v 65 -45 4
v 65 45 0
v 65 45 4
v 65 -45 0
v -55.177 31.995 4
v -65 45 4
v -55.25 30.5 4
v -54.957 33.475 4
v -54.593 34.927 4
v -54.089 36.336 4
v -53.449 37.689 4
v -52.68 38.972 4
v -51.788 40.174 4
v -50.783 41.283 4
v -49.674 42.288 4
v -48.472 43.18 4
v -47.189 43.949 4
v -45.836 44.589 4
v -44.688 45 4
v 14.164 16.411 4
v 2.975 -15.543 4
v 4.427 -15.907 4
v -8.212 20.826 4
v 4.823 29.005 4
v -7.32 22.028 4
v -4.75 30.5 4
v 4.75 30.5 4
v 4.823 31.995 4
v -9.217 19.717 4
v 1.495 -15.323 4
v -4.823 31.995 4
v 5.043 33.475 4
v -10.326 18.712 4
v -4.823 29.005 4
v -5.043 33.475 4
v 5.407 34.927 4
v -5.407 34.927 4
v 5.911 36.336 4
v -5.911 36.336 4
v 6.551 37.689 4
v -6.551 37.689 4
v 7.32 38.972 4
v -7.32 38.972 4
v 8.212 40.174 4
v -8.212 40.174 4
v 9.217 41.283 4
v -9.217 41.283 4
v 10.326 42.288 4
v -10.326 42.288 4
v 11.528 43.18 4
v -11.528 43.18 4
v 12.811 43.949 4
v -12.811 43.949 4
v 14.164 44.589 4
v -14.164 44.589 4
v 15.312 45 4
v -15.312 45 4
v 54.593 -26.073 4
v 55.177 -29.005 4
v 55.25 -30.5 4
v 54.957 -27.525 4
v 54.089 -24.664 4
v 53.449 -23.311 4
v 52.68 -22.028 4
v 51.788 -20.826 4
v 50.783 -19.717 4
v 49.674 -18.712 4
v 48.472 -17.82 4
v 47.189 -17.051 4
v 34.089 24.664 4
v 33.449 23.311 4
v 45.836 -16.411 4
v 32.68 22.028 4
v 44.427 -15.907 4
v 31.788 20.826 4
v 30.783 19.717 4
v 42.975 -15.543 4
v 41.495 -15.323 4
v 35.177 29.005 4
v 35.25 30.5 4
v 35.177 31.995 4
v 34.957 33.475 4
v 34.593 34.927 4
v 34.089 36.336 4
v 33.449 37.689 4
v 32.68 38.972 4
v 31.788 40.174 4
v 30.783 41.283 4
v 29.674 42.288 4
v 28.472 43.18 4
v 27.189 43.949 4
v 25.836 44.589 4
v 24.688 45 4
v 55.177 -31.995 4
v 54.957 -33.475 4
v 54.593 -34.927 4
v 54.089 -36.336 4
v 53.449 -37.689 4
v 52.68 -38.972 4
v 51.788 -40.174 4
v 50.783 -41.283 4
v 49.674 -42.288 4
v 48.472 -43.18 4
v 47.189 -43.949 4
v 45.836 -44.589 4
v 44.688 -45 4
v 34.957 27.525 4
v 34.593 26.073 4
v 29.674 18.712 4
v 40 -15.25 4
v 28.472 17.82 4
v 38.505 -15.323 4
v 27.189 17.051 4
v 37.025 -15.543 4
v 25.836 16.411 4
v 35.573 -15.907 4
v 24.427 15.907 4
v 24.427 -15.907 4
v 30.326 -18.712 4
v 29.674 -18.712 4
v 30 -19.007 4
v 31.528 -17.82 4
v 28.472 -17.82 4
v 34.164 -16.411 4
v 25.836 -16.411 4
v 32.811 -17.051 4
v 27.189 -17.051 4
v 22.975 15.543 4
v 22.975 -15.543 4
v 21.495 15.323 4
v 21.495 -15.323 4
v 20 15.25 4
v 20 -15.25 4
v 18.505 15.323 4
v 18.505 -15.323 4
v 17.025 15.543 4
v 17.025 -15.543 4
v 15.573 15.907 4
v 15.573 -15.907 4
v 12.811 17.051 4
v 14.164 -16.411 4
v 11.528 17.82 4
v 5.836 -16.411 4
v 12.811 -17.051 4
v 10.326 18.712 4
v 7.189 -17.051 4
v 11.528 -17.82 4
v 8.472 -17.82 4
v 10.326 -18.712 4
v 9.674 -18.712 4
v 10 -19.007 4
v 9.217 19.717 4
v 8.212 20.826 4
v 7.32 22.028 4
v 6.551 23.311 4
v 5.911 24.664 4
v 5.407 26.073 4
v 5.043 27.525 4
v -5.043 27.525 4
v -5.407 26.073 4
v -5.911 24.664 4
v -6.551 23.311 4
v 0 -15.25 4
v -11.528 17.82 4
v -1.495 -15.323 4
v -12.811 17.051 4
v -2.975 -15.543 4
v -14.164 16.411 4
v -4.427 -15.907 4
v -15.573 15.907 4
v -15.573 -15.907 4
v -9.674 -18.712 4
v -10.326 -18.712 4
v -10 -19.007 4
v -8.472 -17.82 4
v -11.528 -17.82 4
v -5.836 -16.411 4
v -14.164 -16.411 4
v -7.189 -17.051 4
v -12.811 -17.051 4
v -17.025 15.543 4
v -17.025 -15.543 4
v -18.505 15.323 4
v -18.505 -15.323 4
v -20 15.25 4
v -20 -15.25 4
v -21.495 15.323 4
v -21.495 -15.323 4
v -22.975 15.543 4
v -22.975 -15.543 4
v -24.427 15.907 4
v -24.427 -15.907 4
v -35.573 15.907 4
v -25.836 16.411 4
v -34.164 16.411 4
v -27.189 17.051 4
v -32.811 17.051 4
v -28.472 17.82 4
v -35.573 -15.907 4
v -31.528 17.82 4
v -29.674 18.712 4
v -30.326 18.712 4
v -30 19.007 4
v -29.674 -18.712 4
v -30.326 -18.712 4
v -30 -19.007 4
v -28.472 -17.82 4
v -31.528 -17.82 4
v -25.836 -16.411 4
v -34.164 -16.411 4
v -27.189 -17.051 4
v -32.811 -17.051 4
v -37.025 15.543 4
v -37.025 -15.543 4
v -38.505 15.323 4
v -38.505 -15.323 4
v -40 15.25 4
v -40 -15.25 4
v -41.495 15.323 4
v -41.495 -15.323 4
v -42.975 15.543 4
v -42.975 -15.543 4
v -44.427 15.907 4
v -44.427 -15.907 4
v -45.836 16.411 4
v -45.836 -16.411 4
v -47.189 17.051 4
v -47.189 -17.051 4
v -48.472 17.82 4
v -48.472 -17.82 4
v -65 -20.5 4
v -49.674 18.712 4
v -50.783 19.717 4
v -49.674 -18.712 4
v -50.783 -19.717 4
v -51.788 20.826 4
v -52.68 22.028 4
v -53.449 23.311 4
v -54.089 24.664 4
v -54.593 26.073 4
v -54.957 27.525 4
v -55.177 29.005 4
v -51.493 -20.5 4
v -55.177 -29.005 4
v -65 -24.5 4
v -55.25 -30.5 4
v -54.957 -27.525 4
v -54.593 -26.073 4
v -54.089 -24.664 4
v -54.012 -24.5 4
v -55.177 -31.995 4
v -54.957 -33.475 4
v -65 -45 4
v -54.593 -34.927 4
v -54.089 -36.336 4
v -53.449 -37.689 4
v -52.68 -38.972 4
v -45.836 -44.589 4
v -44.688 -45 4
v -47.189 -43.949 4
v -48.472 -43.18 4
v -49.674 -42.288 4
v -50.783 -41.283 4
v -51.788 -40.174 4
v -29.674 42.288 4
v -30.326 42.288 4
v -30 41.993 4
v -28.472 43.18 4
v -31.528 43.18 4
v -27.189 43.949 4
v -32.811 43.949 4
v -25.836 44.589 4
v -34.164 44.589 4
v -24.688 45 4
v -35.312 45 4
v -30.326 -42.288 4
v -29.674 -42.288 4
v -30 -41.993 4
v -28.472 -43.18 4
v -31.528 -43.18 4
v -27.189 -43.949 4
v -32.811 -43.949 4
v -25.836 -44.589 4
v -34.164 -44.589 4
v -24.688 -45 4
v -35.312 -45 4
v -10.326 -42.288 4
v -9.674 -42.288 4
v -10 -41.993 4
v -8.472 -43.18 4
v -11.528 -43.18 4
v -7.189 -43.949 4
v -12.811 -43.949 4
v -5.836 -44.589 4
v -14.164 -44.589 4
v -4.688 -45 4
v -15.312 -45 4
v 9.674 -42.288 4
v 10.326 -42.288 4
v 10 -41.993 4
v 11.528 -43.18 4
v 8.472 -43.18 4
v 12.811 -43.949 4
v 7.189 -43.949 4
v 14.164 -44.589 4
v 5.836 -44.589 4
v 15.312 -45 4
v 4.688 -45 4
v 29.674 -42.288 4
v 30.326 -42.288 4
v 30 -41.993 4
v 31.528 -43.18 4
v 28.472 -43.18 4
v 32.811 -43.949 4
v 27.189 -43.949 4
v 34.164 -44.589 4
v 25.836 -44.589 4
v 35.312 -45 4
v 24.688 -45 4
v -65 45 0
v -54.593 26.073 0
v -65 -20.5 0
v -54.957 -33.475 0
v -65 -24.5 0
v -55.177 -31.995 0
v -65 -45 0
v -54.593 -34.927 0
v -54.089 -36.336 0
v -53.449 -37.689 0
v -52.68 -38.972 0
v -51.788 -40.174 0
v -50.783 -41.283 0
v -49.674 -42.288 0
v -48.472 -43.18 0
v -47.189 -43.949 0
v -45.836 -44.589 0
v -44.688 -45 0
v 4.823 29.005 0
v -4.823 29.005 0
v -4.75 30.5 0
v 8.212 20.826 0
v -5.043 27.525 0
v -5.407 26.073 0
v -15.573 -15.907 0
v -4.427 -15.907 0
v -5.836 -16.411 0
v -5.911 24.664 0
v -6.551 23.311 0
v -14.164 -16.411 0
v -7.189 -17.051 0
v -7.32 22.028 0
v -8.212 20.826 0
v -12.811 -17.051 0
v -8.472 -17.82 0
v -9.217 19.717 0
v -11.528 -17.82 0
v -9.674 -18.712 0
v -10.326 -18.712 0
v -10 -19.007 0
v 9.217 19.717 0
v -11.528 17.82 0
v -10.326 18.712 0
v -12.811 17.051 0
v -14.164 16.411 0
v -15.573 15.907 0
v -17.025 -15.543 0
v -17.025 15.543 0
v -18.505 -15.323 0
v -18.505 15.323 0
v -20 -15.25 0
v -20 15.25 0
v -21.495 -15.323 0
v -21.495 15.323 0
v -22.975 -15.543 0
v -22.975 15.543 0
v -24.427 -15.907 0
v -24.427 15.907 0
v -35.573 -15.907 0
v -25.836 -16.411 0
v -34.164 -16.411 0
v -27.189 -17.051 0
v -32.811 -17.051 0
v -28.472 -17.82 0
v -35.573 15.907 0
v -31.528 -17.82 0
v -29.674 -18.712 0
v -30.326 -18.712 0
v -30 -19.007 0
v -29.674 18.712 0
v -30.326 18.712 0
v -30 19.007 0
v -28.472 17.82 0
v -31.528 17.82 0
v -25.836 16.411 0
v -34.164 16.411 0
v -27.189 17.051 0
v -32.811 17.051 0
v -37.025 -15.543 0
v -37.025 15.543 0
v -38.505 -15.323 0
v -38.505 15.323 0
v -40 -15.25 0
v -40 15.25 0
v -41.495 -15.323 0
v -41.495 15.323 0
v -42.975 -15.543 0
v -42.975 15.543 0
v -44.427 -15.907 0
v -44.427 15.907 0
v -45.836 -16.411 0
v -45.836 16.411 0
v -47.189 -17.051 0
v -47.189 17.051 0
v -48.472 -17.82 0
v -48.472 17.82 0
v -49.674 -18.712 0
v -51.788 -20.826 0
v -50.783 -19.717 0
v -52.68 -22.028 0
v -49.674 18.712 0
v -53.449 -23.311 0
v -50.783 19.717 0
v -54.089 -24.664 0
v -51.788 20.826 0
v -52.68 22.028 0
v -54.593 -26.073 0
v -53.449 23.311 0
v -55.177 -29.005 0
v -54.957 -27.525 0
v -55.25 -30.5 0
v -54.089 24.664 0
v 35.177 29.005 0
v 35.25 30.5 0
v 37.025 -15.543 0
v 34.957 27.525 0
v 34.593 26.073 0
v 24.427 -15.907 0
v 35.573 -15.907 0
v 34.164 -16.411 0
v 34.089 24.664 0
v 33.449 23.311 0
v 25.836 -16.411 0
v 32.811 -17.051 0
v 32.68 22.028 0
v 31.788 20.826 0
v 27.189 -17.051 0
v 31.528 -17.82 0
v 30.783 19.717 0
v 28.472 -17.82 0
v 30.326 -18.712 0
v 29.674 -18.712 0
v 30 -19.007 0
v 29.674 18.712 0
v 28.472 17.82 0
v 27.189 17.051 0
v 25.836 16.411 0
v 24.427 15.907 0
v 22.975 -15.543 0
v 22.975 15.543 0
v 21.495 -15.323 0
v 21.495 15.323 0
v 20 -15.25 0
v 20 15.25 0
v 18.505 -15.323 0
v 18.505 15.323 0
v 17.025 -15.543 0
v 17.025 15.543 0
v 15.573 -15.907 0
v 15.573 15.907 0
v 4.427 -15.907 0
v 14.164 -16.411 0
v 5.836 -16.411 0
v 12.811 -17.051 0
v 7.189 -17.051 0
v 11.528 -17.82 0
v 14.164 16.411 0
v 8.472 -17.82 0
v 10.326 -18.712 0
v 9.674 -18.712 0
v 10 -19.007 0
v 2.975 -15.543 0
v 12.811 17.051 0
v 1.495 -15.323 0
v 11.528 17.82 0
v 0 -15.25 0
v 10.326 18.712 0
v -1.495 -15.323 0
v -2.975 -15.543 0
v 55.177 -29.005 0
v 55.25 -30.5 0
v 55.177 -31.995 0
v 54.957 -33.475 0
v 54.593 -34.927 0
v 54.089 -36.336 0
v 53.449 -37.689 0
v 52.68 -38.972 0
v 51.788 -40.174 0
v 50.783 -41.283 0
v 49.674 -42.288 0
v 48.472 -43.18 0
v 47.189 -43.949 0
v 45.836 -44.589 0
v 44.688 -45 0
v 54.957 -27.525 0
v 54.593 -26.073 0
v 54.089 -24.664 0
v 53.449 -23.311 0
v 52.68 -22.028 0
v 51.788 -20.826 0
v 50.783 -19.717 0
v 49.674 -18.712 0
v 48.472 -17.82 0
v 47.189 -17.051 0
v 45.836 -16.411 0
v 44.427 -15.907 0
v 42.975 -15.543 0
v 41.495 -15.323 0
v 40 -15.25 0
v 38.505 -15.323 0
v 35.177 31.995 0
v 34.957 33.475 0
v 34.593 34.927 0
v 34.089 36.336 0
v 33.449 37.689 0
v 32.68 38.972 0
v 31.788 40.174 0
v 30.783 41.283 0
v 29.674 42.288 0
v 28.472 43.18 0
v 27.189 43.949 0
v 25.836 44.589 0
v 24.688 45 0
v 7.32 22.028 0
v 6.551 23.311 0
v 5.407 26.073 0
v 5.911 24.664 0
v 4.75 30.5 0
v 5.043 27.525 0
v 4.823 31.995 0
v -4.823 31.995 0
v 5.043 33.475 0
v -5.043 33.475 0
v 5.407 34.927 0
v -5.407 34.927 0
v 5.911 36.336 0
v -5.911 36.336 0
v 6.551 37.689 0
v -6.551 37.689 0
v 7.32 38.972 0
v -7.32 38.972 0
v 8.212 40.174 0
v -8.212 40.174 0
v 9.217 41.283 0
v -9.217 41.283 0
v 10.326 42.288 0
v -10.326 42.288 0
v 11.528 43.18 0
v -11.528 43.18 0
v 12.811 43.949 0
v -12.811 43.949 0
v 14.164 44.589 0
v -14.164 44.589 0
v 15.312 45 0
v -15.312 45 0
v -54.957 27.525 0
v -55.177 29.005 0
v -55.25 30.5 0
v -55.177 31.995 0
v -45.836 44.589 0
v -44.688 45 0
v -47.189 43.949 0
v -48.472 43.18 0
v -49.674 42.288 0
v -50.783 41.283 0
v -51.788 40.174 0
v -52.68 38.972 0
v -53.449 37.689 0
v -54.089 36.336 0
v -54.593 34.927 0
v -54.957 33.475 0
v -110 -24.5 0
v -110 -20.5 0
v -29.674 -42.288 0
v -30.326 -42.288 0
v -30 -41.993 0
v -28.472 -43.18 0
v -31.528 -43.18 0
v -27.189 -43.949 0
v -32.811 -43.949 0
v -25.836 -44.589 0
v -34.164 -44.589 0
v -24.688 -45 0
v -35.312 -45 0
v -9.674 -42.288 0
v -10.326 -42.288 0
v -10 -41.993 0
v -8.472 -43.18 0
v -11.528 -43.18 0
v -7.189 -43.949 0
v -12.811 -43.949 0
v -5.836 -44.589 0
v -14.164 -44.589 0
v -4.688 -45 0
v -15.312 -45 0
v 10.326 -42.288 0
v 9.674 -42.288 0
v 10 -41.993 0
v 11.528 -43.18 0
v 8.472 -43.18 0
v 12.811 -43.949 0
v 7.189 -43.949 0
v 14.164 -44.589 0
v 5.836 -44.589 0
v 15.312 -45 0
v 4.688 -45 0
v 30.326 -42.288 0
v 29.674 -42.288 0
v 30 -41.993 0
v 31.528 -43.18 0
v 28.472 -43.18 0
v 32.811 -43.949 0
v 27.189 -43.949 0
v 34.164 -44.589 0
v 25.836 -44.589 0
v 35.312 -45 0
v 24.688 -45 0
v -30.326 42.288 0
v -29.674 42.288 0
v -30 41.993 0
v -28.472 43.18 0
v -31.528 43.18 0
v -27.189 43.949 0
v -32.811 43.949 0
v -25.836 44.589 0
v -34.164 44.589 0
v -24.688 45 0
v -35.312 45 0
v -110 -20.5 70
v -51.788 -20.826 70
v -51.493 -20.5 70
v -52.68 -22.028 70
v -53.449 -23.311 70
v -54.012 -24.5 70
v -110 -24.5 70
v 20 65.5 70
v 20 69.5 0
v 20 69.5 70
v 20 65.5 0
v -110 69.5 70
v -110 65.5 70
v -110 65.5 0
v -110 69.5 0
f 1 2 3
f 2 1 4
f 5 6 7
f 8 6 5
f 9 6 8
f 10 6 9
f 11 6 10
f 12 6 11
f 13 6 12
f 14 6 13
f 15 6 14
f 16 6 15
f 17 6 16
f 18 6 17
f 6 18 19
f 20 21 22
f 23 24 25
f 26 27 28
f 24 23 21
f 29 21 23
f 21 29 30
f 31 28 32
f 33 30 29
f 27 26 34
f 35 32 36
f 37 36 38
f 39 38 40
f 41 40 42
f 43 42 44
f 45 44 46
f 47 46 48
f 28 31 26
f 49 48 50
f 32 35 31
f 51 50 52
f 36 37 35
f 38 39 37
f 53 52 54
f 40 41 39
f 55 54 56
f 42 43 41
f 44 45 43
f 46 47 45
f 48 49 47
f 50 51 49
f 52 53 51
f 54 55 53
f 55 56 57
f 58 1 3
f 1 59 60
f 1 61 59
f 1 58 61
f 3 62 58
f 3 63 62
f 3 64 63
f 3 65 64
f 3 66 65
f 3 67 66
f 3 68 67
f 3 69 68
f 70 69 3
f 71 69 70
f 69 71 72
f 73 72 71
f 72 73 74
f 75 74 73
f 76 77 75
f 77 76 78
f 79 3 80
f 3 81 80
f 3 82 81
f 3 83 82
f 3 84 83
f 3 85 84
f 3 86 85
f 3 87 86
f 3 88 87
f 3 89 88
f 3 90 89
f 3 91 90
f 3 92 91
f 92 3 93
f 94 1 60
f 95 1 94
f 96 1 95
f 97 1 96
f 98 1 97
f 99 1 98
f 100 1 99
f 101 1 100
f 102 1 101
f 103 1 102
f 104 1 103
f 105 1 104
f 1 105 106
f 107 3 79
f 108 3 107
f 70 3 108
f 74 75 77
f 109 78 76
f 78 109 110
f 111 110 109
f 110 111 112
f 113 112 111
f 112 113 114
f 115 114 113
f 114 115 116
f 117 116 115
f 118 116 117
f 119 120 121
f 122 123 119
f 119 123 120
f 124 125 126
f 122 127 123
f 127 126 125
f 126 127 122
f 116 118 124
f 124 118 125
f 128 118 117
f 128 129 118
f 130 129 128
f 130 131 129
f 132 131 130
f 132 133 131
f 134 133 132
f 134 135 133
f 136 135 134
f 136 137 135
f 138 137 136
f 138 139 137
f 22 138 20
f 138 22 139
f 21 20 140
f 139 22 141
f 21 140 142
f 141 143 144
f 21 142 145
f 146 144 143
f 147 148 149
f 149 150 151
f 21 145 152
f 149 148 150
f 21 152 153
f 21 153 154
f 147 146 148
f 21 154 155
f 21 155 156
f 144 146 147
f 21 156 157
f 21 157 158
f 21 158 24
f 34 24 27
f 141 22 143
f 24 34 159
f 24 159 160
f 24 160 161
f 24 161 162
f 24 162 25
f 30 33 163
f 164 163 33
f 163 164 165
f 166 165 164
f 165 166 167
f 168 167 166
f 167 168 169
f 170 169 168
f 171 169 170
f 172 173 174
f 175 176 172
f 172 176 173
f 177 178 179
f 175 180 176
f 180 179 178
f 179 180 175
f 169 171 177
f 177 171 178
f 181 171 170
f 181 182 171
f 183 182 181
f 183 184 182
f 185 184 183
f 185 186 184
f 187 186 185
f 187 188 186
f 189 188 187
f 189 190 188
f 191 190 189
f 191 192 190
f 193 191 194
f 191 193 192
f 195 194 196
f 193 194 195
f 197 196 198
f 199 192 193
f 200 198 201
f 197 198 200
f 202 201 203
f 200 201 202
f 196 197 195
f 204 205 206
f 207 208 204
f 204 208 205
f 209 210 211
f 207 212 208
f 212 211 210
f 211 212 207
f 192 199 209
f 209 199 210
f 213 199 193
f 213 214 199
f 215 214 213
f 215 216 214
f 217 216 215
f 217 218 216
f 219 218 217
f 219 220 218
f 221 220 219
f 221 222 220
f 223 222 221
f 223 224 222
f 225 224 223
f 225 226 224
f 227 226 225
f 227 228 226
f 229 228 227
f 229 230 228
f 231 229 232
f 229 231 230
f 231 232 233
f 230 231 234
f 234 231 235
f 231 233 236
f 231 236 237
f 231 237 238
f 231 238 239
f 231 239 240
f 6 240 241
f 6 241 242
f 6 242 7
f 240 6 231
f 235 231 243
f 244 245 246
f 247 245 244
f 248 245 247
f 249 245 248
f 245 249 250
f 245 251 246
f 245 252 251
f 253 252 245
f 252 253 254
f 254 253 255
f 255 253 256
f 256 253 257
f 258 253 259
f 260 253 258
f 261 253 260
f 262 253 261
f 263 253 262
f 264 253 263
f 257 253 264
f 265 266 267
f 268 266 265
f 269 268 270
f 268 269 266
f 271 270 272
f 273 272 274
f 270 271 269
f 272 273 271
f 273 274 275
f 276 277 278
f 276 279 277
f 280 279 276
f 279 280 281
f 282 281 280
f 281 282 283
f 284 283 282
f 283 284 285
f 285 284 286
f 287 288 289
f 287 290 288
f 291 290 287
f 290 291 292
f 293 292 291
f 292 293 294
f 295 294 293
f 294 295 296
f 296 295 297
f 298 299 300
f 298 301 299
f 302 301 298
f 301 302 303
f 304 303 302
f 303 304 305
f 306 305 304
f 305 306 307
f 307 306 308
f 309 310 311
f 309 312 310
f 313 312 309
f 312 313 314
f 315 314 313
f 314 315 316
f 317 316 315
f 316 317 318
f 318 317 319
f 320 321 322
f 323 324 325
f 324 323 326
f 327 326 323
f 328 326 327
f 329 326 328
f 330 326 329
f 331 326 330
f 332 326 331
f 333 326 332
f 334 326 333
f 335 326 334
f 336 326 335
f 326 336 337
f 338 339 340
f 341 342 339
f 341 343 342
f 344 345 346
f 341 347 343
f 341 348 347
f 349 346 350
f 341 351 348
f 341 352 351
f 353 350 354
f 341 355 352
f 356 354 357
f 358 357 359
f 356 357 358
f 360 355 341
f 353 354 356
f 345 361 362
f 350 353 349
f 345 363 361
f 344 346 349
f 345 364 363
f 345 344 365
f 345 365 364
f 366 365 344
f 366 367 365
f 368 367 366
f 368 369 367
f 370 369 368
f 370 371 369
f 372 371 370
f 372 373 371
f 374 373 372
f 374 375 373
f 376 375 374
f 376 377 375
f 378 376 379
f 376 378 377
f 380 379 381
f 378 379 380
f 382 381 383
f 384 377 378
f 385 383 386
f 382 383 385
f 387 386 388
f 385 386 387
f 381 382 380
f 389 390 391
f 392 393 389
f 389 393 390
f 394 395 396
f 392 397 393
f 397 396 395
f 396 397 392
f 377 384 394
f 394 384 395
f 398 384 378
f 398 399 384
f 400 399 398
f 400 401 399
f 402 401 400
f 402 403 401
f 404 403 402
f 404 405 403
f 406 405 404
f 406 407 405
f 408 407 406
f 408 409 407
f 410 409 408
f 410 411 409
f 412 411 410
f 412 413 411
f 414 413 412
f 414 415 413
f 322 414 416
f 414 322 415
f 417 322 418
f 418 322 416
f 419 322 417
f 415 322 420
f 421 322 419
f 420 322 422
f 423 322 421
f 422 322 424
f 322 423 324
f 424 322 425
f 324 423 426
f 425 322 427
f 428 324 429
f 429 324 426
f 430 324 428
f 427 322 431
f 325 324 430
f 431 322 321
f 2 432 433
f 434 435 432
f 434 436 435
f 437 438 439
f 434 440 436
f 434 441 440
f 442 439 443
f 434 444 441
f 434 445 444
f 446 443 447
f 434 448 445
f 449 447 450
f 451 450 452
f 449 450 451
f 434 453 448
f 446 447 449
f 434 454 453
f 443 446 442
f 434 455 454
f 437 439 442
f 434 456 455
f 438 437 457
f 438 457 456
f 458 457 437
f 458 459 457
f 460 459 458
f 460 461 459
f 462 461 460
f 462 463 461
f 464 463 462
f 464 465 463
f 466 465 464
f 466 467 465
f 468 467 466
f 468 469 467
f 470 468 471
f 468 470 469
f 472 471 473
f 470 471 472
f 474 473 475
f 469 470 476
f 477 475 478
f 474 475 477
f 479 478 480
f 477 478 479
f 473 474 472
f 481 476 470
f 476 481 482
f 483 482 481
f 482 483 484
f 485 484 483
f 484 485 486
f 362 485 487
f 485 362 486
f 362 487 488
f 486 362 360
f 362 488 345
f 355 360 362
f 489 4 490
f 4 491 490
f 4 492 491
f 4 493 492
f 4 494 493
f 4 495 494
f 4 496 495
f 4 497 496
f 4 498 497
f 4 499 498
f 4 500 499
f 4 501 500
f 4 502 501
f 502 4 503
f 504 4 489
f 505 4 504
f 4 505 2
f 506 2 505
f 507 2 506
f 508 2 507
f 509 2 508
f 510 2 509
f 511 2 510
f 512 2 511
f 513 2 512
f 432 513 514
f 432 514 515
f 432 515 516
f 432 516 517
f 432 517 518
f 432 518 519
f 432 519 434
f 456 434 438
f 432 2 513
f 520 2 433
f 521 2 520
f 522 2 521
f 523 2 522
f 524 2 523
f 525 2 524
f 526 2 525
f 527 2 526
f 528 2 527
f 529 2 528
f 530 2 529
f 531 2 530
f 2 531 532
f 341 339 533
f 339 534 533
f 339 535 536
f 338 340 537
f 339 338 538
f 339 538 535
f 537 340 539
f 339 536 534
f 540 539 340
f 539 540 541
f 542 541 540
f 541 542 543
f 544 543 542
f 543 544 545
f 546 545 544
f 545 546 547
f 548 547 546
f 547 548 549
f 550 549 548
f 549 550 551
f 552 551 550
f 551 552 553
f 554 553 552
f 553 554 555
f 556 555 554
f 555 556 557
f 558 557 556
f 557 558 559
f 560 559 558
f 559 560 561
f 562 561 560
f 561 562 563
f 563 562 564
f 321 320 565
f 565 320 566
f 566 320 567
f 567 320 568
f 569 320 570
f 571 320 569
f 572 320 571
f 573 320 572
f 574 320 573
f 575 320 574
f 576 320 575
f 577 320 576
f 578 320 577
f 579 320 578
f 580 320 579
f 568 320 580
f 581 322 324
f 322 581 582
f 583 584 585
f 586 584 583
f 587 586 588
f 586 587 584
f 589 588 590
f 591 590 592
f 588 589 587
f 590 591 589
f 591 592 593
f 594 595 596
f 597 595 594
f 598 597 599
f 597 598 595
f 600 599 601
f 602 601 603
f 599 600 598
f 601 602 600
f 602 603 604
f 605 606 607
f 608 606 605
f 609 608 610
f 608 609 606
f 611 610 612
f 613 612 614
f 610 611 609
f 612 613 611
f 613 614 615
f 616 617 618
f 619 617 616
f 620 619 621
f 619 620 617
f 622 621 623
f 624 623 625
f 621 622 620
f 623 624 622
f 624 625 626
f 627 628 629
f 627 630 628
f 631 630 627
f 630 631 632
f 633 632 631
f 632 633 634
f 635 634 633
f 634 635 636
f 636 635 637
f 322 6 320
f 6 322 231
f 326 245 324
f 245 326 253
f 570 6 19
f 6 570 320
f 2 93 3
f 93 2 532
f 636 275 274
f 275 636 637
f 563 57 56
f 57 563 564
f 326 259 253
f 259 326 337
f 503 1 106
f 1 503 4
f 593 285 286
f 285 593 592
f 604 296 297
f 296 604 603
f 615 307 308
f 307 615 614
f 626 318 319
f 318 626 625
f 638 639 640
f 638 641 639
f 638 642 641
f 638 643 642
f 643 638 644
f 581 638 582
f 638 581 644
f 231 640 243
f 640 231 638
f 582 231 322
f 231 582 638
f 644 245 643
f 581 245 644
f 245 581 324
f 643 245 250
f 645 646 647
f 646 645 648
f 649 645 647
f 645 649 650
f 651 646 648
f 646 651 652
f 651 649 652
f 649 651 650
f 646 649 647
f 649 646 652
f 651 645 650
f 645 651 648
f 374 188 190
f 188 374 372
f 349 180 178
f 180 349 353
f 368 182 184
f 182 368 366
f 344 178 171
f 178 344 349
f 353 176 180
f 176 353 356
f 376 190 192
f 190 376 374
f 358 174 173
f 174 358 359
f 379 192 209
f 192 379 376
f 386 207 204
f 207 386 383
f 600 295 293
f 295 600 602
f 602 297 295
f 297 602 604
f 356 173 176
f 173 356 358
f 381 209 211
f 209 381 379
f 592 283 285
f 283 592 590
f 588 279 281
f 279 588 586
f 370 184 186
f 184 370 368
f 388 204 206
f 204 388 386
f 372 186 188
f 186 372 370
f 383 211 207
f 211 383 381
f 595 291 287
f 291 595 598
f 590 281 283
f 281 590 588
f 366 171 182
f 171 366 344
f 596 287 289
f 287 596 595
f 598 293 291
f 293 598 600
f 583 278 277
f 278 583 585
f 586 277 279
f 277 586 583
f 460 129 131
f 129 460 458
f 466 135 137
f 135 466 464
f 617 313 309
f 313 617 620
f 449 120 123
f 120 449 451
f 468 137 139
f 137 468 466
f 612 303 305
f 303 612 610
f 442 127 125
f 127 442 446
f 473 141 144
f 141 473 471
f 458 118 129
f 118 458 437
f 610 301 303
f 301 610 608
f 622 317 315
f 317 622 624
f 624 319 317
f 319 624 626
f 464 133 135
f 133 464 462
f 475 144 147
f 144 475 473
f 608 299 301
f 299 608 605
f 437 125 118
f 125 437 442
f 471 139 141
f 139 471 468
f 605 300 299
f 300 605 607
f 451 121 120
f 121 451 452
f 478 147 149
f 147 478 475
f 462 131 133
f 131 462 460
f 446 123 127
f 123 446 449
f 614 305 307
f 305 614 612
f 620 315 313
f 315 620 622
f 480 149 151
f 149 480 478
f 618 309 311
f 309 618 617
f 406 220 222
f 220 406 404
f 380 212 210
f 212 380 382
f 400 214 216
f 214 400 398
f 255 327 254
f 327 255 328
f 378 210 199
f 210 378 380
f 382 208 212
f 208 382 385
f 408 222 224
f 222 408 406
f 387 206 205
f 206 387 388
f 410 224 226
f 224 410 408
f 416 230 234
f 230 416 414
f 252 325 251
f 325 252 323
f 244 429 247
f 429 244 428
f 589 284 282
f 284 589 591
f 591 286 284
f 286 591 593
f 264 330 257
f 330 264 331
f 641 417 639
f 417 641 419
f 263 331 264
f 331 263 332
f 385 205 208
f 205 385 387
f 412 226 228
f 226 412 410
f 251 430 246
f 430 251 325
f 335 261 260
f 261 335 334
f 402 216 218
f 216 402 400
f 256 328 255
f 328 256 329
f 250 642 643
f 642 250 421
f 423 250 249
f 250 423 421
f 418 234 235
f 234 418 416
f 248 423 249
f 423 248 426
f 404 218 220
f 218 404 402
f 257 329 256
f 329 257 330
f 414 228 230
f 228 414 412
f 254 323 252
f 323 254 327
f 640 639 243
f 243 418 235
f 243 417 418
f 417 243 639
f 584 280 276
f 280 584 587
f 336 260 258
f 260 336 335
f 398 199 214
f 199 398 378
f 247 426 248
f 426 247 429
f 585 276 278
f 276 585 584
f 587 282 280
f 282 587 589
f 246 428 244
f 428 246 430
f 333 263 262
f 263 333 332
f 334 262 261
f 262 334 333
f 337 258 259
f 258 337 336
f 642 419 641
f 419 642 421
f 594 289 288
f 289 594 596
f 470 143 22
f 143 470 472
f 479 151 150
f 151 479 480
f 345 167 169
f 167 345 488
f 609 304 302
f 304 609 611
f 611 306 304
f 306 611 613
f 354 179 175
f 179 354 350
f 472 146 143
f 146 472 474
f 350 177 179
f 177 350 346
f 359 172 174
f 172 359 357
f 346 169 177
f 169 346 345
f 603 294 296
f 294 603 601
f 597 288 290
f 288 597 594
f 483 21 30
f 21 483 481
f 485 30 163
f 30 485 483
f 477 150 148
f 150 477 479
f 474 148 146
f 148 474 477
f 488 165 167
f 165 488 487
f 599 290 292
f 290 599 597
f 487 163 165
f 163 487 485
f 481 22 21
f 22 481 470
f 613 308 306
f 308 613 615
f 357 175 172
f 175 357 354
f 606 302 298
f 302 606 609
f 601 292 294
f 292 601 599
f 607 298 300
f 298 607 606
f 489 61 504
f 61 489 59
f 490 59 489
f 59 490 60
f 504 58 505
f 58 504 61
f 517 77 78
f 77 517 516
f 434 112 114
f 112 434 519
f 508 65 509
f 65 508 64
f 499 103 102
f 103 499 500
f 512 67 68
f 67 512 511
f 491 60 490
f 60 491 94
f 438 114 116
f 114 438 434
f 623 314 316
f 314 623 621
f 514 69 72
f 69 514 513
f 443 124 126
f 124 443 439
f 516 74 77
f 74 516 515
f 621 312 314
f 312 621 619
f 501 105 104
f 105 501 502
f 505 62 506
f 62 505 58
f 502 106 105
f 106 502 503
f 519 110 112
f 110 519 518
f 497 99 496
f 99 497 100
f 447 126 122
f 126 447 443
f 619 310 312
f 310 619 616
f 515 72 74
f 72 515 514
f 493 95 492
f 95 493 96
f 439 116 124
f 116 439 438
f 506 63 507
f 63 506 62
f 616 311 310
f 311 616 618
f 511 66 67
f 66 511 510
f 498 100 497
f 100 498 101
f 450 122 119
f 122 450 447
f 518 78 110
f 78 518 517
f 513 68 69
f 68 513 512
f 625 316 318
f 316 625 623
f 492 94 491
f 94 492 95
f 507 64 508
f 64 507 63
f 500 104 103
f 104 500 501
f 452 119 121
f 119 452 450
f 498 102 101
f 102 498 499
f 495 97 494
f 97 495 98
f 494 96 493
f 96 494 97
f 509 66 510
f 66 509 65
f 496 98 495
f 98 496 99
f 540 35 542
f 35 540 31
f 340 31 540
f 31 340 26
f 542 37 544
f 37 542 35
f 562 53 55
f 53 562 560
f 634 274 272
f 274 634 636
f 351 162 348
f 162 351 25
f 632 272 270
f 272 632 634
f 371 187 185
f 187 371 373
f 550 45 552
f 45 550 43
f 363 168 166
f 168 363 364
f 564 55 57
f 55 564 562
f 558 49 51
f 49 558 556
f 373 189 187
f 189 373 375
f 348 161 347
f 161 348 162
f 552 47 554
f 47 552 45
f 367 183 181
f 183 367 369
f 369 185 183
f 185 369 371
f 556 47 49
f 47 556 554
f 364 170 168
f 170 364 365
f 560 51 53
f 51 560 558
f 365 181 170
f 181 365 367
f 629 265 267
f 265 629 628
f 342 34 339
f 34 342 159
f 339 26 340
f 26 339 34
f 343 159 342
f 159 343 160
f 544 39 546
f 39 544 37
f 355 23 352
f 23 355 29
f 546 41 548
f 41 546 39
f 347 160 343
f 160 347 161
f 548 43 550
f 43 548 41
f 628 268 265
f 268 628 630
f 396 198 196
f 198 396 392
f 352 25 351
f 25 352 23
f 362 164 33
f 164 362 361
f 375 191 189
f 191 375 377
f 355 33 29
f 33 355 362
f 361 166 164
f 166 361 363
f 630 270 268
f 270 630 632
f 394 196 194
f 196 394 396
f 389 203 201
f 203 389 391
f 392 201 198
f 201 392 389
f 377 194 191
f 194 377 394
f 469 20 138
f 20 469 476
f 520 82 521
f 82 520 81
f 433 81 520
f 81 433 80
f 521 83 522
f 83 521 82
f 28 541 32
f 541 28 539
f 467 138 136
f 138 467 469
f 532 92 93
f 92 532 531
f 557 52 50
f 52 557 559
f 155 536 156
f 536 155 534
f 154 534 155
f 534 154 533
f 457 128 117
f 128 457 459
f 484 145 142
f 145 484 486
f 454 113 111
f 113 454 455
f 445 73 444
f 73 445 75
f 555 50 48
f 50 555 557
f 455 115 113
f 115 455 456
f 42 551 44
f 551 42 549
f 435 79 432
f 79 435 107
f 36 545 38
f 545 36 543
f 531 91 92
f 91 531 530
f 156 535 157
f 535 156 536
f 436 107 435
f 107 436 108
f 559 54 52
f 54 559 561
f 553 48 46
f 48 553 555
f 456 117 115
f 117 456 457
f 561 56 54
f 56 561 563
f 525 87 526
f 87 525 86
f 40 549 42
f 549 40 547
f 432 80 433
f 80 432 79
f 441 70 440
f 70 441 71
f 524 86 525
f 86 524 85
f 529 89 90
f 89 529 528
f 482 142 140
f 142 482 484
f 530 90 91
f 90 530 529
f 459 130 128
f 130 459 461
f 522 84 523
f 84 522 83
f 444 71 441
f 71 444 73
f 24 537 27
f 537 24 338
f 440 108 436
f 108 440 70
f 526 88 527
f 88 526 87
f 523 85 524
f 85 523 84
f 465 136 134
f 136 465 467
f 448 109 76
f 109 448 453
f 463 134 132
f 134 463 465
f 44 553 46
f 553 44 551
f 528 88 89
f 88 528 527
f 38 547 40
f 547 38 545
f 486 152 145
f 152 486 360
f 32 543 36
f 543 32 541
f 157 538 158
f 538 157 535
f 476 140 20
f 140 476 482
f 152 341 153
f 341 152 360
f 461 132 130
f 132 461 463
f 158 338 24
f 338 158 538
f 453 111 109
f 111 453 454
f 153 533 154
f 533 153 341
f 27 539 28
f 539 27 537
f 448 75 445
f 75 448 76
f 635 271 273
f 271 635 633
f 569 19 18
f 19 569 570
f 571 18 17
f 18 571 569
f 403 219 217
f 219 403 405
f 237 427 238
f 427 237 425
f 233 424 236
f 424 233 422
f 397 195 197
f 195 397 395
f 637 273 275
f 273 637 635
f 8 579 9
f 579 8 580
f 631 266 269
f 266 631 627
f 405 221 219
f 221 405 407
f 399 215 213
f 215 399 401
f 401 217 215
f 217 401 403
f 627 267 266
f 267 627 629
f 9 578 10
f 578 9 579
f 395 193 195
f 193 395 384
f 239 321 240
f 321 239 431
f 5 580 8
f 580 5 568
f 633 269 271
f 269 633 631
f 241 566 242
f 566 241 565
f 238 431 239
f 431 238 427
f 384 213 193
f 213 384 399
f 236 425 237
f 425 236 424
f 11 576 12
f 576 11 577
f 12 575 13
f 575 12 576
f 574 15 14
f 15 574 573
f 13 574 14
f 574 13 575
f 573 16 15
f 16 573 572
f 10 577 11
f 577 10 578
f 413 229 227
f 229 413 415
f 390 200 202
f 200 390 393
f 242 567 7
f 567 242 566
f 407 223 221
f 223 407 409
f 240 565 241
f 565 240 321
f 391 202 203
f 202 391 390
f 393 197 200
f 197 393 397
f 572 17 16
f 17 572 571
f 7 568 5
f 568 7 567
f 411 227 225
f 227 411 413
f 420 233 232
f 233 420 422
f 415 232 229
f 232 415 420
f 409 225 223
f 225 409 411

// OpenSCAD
// Built by bench/smallmodels/features/compiler.py from a list of features.
$fn = 64;
difference() {
  union() {
    translate([0, 0, 0]) translate([-65, -45, 0]) cube([130, 90, 4]);
    translate([-45, -22.5, 0]) translate([-65, -2, 0]) cube([130, 4, 70]);
    translate([-45, 67.5, 0]) translate([-65, -2, 0]) cube([130, 4, 70]);
  }
  union() {
    translate([-20, -30.5, -1]) rotate([0, 0, 0]) cylinder(d = 30.5, h = 72);
    translate([20, -30.5, -1]) rotate([0, 0, 0]) cylinder(d = 30.5, h = 72);
    translate([-40, -30.5, -1]) rotate([0, 0, 0]) cylinder(d = 30.5, h = 72);
    translate([0, -30.5, -1]) rotate([0, 0, 0]) cylinder(d = 30.5, h = 72);
    translate([40, -30.5, -1]) rotate([0, 0, 0]) cylinder(d = 30.5, h = 72);
    translate([-20, 30.5, -1]) rotate([0, 0, 0]) cylinder(d = 30.5, h = 72);
    translate([20, 30.5, -1]) rotate([0, 0, 0]) cylinder(d = 30.5, h = 72);
    translate([-40, 30.5, -1]) rotate([0, 0, 0]) cylinder(d = 30.5, h = 72);
  }
}
